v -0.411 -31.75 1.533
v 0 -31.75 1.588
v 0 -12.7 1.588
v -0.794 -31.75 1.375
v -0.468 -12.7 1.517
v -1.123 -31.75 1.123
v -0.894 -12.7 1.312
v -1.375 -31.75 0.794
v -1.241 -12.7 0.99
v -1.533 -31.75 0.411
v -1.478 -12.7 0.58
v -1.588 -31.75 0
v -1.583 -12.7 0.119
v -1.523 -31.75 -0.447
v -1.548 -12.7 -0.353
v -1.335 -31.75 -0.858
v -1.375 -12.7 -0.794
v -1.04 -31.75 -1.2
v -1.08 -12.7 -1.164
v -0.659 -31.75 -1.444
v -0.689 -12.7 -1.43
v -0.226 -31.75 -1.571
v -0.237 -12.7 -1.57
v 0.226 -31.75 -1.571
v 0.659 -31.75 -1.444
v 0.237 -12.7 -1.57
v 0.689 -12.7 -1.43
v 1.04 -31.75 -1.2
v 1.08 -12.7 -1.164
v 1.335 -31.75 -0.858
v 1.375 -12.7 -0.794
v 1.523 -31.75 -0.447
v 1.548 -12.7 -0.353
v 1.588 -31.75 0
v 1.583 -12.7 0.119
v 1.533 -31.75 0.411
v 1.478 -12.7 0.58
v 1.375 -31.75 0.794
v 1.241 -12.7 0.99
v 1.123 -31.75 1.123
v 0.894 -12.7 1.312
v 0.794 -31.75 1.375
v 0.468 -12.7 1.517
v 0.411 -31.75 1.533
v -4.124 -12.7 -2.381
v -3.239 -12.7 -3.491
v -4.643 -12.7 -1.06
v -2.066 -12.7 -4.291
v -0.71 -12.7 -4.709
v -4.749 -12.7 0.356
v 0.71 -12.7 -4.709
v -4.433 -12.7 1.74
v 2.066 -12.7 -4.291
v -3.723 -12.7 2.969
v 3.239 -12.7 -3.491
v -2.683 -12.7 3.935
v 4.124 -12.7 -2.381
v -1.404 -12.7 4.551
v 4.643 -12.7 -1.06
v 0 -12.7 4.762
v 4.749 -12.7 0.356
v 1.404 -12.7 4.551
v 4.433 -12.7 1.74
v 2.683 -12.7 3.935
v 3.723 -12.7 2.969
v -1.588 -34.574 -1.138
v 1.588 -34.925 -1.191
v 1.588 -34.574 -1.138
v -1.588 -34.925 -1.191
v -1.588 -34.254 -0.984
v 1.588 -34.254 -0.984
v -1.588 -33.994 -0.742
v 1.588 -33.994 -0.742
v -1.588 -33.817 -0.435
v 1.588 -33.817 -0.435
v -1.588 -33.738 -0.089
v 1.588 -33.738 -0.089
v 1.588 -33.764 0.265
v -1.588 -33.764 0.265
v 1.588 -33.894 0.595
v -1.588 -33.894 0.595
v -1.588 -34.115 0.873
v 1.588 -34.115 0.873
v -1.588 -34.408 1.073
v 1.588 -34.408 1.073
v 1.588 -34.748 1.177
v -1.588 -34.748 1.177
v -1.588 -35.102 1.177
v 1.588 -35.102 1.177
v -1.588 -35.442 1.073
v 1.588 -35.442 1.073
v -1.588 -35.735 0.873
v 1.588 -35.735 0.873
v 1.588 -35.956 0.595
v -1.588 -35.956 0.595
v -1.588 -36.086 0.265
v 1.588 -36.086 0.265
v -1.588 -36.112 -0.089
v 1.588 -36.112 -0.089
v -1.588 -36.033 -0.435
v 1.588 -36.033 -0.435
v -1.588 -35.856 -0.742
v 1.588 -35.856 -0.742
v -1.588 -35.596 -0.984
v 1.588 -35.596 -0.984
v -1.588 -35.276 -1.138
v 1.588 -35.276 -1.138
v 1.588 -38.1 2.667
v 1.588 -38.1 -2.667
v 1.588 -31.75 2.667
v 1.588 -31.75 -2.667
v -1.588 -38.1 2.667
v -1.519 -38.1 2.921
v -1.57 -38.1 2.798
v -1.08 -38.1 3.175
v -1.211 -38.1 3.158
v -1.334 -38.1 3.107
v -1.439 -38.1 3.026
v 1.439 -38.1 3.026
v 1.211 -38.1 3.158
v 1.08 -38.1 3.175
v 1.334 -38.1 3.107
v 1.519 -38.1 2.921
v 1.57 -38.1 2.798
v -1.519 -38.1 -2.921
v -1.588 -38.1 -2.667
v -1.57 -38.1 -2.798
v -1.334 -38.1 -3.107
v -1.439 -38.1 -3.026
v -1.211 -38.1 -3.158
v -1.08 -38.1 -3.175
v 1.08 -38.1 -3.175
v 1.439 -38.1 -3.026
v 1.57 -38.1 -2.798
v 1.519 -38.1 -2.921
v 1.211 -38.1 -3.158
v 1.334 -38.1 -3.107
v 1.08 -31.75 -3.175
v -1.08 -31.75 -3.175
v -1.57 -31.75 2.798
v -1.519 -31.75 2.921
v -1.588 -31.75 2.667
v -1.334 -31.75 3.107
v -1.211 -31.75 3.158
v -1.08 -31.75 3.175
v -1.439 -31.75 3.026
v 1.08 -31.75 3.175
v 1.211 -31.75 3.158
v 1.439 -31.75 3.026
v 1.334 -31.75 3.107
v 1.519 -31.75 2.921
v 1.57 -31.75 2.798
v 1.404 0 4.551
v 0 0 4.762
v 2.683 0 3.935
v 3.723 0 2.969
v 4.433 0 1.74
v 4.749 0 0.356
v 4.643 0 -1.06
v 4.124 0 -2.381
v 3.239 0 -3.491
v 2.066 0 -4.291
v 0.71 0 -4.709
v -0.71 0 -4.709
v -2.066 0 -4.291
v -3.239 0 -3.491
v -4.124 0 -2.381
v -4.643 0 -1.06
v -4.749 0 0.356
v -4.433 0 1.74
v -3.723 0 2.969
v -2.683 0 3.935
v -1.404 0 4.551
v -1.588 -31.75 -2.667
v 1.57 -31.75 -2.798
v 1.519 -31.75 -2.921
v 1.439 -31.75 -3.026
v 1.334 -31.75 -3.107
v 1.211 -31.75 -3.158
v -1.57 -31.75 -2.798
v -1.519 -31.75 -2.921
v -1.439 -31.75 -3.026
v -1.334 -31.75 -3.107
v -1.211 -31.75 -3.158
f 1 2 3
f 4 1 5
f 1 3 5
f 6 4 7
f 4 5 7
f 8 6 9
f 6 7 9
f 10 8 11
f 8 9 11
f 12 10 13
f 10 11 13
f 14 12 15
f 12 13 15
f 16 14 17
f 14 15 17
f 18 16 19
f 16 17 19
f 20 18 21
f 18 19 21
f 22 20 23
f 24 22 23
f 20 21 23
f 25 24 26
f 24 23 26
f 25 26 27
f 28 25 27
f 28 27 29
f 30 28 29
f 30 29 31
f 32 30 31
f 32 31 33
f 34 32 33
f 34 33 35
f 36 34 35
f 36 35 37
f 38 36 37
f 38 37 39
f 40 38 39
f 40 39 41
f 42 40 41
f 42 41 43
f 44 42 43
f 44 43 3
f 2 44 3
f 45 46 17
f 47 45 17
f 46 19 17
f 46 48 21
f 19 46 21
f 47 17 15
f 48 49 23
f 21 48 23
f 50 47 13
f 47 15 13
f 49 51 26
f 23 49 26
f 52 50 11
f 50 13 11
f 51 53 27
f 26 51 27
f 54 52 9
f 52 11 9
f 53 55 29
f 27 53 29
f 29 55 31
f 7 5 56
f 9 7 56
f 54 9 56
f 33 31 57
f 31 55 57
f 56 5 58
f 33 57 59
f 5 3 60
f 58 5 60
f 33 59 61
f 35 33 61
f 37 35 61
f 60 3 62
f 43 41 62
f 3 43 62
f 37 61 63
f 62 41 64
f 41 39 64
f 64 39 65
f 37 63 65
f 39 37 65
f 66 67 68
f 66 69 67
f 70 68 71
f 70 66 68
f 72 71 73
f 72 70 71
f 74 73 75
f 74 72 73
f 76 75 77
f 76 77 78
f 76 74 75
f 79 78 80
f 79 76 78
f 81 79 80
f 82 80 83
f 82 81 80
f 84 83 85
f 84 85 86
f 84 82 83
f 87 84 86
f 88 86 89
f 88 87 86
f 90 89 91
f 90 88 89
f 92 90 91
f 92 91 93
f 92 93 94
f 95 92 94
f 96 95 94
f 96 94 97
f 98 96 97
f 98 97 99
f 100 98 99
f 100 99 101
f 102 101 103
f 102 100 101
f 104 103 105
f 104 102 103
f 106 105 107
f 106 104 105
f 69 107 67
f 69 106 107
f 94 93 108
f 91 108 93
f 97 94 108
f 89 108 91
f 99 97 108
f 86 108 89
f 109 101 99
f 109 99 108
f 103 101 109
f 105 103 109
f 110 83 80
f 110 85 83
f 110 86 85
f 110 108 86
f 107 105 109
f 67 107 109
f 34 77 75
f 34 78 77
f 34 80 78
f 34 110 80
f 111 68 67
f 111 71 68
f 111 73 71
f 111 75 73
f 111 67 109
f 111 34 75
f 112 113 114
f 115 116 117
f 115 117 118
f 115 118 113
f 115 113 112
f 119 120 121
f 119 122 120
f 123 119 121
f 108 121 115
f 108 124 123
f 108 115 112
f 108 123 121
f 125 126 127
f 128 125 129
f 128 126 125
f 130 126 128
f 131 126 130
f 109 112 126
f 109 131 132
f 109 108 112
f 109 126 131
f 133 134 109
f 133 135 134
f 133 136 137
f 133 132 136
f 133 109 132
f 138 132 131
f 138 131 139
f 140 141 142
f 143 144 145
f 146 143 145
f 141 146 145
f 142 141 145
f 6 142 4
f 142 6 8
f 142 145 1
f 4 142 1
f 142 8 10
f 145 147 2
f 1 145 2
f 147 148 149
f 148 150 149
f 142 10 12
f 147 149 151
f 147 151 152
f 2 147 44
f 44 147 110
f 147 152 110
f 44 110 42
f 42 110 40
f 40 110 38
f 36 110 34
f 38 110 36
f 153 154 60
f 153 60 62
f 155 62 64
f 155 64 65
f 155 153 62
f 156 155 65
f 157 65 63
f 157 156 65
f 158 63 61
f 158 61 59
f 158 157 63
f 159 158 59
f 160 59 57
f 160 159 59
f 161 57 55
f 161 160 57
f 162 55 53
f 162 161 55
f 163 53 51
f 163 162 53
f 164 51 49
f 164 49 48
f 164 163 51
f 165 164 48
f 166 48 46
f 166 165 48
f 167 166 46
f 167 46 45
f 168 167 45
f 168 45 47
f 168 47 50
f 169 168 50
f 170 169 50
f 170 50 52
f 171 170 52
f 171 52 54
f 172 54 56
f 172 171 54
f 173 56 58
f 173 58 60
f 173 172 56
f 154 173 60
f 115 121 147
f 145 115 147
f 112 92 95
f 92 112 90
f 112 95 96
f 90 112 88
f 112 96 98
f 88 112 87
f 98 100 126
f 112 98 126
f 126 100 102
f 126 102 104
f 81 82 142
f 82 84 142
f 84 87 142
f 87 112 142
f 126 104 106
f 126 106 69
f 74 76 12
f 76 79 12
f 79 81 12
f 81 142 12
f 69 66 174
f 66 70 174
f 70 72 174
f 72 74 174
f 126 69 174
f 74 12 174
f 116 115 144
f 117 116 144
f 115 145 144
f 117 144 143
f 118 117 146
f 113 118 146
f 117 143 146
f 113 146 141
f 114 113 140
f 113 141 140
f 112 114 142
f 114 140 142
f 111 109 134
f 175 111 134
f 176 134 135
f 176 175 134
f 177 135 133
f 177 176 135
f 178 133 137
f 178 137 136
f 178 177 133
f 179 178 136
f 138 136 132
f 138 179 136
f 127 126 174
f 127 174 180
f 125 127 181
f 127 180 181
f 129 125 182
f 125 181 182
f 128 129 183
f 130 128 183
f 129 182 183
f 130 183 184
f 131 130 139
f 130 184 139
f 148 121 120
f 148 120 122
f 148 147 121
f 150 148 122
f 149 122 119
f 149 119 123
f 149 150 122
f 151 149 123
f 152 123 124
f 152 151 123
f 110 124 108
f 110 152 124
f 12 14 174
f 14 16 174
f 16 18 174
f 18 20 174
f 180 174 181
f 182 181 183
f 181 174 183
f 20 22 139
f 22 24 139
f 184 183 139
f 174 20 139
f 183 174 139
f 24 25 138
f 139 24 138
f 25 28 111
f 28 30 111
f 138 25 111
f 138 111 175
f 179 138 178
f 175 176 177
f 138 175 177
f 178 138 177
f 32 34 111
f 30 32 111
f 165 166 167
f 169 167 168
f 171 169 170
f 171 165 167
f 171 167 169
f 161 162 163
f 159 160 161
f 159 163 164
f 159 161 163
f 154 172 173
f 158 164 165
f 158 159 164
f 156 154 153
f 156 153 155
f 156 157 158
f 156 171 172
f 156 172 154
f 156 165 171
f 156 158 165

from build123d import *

# Parameters (mm, degrees)
SKETCH2_R           = 4.7625
BOSS_EXTRUDE2_DEPTH = 12.7
SKETCH3_R           = 1.5875
BOSS_EXTRUDE3_DEPTH = 19.05
SKETCH4_W           = 6.35
SKETCH4_H           = 6.35
SKETCH4_R           = 1.190625
BOSS_EXTRUDE4_DEPTH = 1.5875
FILLET2_R           = 0.508


with BuildPart() as part:
    # Sketch2 → Boss-Extrude2 (new body)
    with BuildSketch(Plane(origin=(0, 0, 0), x_dir=(1, 0, 0), z_dir=(0, 1, 0))):
        with Locations(Location((0, 0, 0), (0, 0, 270))):
            Circle(SKETCH2_R)
    extrude(amount=-BOSS_EXTRUDE2_DEPTH)

    # Sketch3 → Boss-Extrude3 (add)
    with BuildSketch(Plane.XZ.offset(12.7)):
        with Locations(Location((0, 0, 0), (0, 0, 90))):
            Circle(SKETCH3_R)
    extrude(amount=BOSS_EXTRUDE3_DEPTH)

    # Sketch4 → Boss-Extrude4 (add, symmetric)
    with BuildSketch(Plane(origin=(0, 0, 0), x_dir=(0, 0, -1), z_dir=(1, 0, 0))):
        with Locations((0, -34.925)):
            Rectangle(SKETCH4_W, SKETCH4_H)
        with Locations((0, -34.925)):
            Circle(SKETCH4_R, mode=Mode.SUBTRACT)
    extrude(amount=BOSS_EXTRUDE4_DEPTH, both=True)

    # Fillet2
    fillet2_edges = [part.edges().sort_by_distance(p)[0] for p in [
        (1.5875, -34.925, 3.175),
        (1.5875, -34.925, -3.175),
        (-1.5875, -34.925, 3.175),
        (-1.5875, -34.925, -3.175),
    ]]
    fillet(fillet2_edges, radius=FILLET2_R)


solid = part.part
